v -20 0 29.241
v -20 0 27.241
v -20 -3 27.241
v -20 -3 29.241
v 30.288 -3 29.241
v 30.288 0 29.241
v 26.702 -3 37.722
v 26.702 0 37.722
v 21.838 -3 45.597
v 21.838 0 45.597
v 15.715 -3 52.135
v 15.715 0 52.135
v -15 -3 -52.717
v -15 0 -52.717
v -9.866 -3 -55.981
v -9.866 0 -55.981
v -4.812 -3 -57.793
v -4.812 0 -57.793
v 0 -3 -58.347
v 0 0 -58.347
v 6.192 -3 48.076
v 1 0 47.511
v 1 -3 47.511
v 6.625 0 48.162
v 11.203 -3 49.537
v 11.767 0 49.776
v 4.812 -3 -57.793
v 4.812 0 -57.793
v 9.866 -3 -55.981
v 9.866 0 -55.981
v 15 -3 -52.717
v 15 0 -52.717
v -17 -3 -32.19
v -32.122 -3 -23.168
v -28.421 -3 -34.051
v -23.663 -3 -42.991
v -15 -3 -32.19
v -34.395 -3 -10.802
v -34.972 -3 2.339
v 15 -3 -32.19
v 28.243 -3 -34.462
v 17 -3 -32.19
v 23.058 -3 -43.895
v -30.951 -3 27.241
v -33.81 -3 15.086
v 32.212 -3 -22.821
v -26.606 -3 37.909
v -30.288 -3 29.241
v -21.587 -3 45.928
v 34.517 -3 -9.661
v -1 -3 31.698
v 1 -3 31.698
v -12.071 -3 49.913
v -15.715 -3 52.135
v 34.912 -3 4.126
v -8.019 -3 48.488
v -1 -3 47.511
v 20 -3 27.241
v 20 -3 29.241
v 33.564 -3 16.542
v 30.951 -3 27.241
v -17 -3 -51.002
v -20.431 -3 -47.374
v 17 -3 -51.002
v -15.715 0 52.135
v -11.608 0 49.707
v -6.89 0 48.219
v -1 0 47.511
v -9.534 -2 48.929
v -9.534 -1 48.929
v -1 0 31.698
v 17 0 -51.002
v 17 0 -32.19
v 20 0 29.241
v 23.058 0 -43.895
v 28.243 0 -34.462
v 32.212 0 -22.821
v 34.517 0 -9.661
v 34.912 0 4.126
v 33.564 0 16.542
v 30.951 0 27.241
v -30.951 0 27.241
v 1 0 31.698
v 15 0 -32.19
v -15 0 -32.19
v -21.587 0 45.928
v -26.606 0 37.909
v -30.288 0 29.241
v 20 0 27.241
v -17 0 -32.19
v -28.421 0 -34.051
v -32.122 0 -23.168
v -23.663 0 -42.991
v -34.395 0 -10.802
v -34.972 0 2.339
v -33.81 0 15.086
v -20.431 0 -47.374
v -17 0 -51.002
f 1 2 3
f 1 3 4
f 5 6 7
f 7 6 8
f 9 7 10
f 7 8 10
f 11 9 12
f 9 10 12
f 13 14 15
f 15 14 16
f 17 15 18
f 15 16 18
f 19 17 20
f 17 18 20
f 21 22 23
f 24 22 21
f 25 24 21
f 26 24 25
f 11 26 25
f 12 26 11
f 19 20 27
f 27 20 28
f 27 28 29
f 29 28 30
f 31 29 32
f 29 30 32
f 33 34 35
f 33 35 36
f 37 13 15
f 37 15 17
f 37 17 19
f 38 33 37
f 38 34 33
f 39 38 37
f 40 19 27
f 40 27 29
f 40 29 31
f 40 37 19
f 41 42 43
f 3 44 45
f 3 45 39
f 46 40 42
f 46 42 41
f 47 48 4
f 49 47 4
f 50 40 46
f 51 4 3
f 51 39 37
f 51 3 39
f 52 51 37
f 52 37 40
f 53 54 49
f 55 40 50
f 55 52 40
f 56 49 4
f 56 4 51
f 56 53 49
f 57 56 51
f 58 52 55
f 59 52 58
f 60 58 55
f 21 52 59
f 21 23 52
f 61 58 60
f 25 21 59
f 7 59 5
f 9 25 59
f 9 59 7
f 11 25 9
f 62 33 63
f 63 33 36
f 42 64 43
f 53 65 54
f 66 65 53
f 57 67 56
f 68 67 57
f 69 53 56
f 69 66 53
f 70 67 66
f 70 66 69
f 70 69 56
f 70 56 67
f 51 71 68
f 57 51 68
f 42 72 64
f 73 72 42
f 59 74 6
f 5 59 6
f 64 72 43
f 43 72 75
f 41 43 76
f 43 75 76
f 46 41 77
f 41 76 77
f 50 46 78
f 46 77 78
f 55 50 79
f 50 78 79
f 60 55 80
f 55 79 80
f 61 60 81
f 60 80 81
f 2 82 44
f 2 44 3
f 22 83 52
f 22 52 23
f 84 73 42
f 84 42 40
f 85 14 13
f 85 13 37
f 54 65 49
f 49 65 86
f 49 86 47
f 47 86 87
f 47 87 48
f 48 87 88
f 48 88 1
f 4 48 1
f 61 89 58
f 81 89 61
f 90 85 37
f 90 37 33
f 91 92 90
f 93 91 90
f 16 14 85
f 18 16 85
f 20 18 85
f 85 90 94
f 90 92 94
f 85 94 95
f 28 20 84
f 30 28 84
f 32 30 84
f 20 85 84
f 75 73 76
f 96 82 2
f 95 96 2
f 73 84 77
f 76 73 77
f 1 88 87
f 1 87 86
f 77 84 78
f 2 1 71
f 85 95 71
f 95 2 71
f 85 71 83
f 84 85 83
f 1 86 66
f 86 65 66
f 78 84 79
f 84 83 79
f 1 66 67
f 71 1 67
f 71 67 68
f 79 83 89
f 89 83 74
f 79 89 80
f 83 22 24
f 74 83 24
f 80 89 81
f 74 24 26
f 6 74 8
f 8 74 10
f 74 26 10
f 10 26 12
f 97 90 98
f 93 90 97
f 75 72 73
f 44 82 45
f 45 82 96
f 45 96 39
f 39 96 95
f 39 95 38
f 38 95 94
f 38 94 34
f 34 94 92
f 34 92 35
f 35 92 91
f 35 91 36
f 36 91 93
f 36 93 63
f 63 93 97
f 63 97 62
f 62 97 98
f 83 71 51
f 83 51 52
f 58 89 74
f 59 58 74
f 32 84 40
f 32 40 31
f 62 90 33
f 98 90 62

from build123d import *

# Parameters (mm, degrees)
F1_DEPTH = 3
F2_W     = 29.469342
F2_H     = 2
F3_DEPTH = 25
F5_DEPTH = 10
F7_DEPTH = 25
F8_W     = 1
F8_H     = 25
F9_DEPTH = 25


with BuildPart() as f1:
    # F0 (on Front) → F1 (new body)
    with BuildSketch(Plane.XZ):
        with BuildLine():
            add(Edge.make_bspline(
                [(0, -58.346872), (60.621778, -58.346872), (30.310889, 29.173436), (0, 116.693744), (-30.310889, 29.173436), (-60.621778, -58.346872), (0, -58.346872)],
                knots=[0, 0, 0, 2.094395, 2.094395, 4.18879, 4.18879, 6.283185, 6.283185, 6.283185], degree=2, weights=[1, 0.5, 1, 0.5, 1, 0.5, 1]))
        make_face()
    extrude(amount=F1_DEPTH)

    # F2 (on Front) → F3 (cut)
    with BuildSketch(Plane.XZ):
        with Locations((-34.734671, 28.240567)):
            Rectangle(F2_W, F2_H)
        with Locations((34.734671, 28.240567)):
            Rectangle(F2_W, F2_H)
    extrude(amount=F3_DEPTH, mode=Mode.SUBTRACT)

    # F4 (on Front) → F5 (cut)
    with BuildSketch(Plane.XZ):
        Polygon((-15, -32.18965), (-17, -32.18965), (-17, -51.198471), (-17, -64.541914), (-15, -64.62919), (-15, -53.12467), align=None)
        Polygon((17, -51.198471), (17, -32.18965), (15, -32.18965), (15, -53.12467), (15, -64.62919), (17, -64.62919), align=None)
    extrude(amount=F5_DEPTH, mode=Mode.SUBTRACT)

    # F6 (on Front) → F7 (cut)
    with BuildSketch(Plane.XZ):
        with BuildLine():
            add(Edge.make_bspline(
                [(19.068396, 58.195755), (19.068396, 76.728505), (-9.534198, 67.46213), (-38.136791, 58.195755), (-9.534198, 48.92938), (19.068396, 39.663005), (19.068396, 58.195755)],
                knots=[0, 0, 0, 2.094395, 2.094395, 4.18879, 4.18879, 6.283185, 6.283185, 6.283185], degree=2, weights=[1, 0.5, 1, 0.5, 1, 0.5, 1]))
        make_face()
    extrude(amount=F7_DEPTH, mode=Mode.SUBTRACT)

    # F8 (on Front) → F9 (cut)
    with BuildSketch(Plane.XZ):
        with Locations((-0.5, 44.198115)):
            Rectangle(F8_W, F8_H)
        with Locations((0.5, 44.198115)):
            Rectangle(F8_W, F8_H)
    extrude(amount=F9_DEPTH, mode=Mode.SUBTRACT)


solid = f1.part
